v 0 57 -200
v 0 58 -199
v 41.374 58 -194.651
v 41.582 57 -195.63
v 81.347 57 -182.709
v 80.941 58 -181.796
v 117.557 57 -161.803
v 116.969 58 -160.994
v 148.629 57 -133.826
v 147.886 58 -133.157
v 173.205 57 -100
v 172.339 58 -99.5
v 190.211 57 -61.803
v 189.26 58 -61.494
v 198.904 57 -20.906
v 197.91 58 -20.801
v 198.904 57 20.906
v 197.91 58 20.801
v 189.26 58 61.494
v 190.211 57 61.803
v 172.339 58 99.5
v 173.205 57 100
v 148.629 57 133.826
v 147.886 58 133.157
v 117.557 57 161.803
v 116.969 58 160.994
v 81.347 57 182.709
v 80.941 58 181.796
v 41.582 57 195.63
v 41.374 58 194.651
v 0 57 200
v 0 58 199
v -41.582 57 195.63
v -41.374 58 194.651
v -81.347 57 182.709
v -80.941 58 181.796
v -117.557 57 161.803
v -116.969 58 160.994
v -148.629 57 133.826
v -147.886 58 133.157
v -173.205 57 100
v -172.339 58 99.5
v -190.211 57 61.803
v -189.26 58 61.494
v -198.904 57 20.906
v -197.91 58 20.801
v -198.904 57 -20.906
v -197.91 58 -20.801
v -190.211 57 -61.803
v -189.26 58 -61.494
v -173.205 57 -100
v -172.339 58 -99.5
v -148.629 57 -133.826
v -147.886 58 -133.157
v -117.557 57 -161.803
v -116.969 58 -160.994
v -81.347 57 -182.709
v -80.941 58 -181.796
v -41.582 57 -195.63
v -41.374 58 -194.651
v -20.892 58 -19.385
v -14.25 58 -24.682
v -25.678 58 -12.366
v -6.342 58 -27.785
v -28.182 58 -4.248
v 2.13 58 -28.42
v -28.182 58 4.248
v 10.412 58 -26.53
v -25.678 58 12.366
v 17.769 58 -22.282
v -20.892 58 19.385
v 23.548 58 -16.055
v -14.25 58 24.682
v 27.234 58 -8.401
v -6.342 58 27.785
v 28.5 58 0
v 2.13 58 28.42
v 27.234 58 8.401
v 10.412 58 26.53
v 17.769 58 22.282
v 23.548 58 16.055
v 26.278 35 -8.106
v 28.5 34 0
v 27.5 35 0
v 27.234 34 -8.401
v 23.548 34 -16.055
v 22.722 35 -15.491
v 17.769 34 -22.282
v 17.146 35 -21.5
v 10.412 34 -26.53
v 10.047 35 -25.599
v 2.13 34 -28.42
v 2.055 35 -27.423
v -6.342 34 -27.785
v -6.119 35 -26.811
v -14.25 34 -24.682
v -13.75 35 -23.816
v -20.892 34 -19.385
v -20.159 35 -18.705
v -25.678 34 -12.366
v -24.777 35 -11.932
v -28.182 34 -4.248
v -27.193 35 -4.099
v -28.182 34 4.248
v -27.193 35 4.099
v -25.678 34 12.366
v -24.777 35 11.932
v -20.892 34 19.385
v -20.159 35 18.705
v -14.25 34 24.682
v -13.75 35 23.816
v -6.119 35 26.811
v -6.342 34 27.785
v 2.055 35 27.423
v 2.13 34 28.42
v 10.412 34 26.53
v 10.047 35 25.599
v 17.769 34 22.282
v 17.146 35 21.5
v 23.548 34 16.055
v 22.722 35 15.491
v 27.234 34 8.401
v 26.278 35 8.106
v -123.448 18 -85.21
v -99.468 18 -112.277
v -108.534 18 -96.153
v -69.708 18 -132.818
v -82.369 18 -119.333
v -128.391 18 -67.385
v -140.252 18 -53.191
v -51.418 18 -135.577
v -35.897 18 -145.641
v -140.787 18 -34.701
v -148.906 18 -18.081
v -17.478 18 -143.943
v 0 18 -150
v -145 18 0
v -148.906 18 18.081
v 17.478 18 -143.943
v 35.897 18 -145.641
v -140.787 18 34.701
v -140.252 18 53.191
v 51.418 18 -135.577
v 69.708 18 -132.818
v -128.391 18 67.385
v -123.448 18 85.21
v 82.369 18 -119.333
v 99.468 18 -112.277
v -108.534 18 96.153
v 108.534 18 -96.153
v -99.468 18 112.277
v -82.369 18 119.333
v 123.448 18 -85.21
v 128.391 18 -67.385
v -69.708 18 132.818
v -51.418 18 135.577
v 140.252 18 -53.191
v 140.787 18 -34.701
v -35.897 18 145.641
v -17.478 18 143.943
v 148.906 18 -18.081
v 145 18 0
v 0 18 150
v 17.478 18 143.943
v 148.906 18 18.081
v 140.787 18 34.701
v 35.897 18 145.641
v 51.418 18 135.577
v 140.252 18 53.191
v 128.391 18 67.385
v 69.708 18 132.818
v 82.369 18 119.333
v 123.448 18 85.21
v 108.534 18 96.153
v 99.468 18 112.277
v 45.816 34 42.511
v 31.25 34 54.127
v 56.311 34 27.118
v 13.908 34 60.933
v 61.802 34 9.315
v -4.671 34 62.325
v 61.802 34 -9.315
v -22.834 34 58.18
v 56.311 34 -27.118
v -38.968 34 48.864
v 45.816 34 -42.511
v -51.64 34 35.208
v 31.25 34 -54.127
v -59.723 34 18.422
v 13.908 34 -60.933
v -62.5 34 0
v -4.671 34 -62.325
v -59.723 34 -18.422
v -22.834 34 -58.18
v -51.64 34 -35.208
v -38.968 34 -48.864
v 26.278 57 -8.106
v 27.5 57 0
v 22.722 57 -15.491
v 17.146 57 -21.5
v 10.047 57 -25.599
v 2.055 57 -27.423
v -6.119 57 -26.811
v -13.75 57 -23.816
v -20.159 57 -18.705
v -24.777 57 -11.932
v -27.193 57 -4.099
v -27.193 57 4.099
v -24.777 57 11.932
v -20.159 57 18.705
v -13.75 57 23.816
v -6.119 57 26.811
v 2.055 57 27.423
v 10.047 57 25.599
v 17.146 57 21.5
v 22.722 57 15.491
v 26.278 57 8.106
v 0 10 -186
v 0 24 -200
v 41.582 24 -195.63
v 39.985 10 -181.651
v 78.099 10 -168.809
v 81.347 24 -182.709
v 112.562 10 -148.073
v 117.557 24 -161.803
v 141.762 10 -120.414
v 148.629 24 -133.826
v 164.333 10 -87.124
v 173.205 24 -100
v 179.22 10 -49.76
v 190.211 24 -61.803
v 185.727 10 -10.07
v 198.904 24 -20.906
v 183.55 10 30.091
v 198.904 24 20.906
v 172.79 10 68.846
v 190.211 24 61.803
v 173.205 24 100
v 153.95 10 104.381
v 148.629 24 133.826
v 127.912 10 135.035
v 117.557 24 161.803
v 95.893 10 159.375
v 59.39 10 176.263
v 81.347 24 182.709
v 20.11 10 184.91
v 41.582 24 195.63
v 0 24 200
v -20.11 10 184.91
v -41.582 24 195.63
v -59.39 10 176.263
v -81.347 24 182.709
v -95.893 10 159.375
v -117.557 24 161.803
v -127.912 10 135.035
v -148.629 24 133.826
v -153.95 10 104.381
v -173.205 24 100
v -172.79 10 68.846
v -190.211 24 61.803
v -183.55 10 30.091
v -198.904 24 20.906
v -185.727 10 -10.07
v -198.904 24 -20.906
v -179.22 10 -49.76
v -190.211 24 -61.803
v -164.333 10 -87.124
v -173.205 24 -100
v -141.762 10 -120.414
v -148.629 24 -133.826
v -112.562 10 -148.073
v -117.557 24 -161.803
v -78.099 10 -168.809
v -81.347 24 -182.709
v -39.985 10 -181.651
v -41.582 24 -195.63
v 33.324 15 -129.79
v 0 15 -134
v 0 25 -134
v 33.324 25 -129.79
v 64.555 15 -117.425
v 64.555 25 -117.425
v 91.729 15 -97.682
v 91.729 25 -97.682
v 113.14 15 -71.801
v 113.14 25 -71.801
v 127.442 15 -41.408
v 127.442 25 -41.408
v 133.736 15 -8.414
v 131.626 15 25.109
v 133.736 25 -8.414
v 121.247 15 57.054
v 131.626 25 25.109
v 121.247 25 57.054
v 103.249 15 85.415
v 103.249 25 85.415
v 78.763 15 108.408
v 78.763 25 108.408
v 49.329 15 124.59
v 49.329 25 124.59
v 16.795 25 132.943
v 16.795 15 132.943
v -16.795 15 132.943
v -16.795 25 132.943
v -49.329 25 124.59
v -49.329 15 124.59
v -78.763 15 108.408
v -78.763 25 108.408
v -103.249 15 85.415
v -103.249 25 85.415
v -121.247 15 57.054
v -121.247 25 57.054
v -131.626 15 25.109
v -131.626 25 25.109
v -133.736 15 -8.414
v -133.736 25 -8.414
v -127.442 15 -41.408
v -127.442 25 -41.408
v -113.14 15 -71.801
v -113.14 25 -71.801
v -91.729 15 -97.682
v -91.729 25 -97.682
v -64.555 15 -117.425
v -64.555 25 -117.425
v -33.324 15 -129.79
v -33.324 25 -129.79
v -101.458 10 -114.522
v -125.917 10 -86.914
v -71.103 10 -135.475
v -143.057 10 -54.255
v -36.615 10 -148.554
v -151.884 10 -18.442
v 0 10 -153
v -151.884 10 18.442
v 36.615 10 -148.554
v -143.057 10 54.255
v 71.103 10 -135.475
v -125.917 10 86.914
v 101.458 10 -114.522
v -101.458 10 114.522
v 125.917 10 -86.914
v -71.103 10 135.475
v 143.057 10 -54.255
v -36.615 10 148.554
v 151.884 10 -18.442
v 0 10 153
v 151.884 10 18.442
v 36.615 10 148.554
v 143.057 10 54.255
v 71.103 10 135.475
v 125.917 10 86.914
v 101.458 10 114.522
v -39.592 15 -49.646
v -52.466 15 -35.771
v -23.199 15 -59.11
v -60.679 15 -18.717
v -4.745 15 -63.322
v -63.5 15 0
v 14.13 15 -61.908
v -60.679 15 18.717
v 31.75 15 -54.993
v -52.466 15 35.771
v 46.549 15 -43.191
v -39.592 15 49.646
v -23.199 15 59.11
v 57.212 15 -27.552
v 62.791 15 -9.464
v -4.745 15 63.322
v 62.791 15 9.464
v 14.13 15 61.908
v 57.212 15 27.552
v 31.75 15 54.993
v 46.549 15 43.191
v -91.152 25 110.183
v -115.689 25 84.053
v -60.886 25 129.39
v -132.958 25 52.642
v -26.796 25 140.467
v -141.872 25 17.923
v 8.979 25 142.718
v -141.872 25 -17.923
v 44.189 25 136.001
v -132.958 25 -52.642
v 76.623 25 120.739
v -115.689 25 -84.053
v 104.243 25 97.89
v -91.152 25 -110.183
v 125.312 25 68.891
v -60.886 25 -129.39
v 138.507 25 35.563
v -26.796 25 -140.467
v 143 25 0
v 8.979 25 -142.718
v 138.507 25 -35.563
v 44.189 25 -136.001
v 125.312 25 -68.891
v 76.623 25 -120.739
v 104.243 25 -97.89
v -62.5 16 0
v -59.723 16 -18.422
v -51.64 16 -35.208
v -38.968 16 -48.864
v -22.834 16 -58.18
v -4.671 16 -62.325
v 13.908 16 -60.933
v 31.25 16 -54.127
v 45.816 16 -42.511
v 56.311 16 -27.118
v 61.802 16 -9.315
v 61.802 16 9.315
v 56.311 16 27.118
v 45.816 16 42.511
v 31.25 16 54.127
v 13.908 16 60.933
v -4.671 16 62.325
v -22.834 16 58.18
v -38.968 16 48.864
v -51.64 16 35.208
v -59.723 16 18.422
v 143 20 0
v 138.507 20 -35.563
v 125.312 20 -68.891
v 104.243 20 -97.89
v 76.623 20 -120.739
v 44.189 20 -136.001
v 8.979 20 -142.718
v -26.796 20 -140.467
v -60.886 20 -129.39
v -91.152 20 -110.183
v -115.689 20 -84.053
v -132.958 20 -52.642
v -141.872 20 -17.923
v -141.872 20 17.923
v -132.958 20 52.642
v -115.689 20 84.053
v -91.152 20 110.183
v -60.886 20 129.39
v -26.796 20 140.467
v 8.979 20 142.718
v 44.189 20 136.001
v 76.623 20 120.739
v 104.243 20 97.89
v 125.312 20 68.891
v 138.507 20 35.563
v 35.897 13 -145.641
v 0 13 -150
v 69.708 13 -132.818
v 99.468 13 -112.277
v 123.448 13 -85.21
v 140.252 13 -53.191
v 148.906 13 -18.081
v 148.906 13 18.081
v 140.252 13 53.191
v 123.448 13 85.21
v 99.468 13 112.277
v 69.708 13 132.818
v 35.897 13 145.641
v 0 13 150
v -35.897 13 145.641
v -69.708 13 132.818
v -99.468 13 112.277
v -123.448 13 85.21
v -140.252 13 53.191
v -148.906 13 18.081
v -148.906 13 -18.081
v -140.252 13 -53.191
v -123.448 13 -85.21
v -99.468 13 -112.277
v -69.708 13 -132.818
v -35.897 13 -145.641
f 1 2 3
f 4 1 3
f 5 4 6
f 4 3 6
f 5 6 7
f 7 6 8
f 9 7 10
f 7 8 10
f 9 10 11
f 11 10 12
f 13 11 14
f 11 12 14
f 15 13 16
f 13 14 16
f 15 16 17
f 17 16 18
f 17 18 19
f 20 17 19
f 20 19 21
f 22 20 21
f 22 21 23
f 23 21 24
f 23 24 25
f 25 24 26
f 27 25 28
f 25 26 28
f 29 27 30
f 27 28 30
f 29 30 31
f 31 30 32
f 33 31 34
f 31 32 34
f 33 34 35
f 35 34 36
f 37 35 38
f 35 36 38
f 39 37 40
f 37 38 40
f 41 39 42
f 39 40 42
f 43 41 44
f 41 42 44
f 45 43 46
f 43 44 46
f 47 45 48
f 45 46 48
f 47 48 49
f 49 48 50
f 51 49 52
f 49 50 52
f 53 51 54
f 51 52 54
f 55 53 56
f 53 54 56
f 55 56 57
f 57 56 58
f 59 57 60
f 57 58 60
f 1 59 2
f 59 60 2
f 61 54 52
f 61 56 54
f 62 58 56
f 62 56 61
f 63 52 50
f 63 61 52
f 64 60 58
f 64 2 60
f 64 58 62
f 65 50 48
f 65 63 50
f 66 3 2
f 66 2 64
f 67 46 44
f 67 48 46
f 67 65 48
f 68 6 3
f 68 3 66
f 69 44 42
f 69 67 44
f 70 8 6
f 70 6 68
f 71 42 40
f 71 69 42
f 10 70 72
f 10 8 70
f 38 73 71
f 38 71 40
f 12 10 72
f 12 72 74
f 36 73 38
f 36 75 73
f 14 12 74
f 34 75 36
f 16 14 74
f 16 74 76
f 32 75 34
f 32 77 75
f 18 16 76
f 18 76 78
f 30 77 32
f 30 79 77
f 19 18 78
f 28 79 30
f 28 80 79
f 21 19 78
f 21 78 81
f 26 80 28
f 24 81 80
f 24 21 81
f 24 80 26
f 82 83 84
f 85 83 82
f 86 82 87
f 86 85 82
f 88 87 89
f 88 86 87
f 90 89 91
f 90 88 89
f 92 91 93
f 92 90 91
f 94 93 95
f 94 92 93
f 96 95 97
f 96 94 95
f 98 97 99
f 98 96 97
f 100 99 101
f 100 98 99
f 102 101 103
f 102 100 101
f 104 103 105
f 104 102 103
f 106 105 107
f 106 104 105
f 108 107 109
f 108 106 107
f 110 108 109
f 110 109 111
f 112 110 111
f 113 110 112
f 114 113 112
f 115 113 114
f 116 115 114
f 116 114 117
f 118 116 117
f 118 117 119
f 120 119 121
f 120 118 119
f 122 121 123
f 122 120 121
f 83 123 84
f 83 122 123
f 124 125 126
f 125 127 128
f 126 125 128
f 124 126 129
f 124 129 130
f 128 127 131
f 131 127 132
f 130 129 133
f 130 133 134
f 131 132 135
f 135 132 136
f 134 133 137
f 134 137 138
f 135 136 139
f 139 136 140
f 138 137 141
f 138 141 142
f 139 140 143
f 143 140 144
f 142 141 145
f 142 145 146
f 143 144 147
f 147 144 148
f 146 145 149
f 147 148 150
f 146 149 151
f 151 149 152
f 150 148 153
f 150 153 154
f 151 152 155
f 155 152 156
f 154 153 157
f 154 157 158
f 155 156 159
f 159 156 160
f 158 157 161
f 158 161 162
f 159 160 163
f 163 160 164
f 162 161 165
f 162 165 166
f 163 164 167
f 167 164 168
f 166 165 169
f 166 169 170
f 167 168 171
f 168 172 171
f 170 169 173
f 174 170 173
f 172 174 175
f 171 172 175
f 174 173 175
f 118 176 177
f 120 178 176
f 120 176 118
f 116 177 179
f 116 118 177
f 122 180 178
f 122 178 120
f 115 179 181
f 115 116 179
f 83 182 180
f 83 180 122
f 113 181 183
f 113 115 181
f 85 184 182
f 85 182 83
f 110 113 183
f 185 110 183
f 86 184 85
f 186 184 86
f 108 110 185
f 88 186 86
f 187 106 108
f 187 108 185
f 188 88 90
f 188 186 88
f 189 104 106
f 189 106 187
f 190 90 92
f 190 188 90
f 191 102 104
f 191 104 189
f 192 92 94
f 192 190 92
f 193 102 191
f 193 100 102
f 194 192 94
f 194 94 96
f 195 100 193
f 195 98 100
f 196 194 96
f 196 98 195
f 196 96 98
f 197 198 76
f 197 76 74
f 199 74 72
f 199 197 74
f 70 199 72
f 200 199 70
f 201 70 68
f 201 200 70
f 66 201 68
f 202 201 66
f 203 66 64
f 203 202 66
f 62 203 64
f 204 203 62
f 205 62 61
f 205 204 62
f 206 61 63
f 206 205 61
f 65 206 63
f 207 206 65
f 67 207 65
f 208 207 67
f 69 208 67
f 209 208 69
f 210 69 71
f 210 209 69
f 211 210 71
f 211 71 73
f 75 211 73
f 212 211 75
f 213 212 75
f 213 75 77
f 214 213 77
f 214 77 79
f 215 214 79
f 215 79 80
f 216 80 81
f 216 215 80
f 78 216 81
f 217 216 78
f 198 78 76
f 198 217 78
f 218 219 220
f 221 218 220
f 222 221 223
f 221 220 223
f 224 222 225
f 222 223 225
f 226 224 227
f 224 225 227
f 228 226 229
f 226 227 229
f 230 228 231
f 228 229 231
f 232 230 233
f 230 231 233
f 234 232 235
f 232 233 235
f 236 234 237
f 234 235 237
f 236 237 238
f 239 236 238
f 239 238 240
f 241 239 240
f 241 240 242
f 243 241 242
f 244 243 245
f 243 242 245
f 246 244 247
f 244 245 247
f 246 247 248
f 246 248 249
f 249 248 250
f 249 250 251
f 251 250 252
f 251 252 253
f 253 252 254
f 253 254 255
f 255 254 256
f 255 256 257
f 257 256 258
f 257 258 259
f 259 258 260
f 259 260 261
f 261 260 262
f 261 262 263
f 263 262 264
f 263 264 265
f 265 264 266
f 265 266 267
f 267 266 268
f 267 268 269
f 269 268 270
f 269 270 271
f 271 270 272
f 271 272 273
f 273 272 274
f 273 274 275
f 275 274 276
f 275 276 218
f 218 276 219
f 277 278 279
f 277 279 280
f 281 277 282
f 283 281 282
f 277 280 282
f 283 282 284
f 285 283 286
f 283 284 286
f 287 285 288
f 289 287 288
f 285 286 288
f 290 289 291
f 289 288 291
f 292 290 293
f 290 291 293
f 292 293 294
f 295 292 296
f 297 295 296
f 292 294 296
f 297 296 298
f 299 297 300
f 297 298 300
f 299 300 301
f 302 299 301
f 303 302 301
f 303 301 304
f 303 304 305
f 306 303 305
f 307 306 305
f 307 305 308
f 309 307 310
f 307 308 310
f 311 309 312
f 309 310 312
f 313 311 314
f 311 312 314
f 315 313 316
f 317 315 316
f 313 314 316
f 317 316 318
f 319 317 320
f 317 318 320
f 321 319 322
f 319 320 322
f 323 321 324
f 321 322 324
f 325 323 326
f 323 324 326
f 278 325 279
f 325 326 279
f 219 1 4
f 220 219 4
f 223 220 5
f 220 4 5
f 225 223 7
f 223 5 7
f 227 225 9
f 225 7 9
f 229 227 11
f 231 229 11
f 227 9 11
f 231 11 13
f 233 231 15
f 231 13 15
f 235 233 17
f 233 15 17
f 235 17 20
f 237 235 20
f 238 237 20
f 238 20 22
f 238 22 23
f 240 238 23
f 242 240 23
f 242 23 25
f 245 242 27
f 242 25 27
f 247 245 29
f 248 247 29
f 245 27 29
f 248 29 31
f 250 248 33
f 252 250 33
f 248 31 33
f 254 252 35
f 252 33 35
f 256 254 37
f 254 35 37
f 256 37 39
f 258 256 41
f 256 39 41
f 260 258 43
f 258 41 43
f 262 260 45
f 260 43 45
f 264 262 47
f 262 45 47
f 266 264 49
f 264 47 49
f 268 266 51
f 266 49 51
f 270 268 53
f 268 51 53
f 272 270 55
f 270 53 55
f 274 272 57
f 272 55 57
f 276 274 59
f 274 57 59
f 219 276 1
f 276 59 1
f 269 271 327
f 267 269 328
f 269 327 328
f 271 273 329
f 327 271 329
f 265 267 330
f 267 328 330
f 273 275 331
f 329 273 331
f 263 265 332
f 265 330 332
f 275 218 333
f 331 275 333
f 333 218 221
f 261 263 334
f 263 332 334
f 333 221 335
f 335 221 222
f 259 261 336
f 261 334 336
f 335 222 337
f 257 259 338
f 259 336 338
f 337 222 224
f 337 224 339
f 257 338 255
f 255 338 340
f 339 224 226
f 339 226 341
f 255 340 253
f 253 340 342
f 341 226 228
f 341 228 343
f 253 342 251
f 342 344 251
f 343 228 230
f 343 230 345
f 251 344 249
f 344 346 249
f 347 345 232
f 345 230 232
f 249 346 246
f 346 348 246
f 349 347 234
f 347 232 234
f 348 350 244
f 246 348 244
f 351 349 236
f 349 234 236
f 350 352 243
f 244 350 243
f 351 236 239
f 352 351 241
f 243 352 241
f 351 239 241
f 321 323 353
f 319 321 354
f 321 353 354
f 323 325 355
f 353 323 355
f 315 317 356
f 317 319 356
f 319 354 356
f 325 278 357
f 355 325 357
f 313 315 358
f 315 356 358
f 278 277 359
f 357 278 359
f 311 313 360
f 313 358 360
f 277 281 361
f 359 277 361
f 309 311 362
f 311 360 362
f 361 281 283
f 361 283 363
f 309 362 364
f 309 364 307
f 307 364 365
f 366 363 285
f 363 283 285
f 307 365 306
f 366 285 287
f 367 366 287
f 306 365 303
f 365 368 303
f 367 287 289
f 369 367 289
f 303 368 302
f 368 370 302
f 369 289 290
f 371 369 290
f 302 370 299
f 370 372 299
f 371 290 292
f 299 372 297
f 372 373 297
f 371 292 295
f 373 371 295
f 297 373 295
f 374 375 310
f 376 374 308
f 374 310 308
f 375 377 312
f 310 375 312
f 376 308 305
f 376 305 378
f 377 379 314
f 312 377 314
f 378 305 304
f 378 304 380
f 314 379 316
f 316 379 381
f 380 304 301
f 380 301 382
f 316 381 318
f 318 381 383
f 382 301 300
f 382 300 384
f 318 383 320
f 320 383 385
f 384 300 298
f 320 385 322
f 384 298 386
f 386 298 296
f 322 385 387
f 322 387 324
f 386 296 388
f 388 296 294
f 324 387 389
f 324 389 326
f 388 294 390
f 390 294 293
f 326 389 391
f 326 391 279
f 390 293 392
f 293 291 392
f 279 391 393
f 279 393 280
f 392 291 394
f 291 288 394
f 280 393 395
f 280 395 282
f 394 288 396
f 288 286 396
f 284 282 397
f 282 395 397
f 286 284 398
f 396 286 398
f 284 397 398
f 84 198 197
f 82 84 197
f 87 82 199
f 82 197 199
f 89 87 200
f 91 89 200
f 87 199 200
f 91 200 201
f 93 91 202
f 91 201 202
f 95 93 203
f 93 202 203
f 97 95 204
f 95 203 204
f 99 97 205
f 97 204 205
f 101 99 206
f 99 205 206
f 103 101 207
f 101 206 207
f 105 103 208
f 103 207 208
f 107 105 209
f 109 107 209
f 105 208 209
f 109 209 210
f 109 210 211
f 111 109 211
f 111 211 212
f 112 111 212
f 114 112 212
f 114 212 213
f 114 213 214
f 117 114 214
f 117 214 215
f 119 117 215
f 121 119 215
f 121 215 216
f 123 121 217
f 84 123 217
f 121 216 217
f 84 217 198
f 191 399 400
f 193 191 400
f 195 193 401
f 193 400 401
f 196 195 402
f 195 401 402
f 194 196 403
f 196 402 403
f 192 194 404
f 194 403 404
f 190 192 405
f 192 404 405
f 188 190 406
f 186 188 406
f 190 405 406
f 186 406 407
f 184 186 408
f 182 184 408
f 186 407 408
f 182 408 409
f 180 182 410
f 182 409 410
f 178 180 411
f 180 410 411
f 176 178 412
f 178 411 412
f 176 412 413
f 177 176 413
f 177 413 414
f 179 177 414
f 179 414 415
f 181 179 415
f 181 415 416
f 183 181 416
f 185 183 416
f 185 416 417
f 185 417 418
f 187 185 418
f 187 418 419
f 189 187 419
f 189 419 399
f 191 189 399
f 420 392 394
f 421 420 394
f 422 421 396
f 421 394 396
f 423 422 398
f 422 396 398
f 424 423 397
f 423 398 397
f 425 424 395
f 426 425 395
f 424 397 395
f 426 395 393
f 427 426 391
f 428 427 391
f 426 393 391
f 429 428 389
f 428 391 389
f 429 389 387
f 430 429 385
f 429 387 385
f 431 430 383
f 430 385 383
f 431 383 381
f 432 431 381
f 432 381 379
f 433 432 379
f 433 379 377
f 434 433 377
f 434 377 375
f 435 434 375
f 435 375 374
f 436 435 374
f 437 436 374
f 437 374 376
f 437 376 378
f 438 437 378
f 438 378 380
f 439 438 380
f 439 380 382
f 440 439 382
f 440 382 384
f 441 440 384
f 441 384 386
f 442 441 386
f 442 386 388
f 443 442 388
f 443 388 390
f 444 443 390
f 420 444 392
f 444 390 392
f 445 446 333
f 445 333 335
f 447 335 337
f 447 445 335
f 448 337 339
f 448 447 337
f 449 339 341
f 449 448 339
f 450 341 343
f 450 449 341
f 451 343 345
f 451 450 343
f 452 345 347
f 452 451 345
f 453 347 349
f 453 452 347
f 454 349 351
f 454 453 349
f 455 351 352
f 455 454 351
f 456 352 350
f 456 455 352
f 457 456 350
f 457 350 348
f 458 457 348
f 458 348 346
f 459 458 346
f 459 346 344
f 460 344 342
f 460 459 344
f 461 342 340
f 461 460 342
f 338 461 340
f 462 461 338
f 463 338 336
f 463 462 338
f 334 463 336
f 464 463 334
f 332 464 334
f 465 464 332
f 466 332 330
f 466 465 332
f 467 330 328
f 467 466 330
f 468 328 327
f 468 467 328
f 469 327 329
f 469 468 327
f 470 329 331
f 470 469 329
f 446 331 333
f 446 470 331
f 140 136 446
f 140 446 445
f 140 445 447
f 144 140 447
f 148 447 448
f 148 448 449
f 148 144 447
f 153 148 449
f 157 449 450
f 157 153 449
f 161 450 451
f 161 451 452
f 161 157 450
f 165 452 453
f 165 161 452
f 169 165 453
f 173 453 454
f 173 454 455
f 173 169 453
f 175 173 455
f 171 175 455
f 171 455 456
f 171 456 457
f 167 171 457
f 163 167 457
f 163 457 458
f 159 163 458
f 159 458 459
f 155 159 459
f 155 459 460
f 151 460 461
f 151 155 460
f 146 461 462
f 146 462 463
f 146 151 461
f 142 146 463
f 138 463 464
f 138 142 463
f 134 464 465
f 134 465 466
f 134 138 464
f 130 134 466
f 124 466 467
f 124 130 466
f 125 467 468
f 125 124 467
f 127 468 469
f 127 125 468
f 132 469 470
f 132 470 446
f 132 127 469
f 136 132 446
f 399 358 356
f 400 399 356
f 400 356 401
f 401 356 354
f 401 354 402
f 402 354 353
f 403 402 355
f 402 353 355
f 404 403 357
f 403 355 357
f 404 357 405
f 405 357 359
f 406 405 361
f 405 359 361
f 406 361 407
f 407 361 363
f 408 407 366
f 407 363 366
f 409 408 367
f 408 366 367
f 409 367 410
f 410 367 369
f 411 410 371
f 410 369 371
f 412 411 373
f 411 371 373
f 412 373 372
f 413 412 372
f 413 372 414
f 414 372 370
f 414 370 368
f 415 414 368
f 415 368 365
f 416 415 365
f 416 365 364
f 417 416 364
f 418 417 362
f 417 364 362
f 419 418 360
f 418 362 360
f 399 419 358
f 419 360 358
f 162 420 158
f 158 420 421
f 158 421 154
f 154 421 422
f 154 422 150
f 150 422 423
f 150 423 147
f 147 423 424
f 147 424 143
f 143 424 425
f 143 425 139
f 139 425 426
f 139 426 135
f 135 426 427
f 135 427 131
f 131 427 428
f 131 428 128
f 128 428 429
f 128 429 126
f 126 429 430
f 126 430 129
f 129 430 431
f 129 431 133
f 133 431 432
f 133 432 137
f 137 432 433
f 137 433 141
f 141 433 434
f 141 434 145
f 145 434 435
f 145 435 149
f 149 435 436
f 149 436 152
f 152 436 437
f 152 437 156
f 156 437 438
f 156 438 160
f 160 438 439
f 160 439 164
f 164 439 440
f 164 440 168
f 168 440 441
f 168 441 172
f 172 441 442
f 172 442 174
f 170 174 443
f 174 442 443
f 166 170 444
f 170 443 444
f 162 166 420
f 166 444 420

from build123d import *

# Parameters (mm, degrees)
SKETCH_1_W                = 200
SKETCH_1_H                = 48
HOLE_WIZARD_1_D           = 286
HOLE_WIZARD_1_DEPTH       = 15
SKETCH_4_W                = 134
SKETCH_4_H                = 10
SKETCH_5_W                = 7
SKETCH_5_H                = 8
HOLE_WIZARD_3_D           = 55
HOLE_WIZARD_3_CBORE_D     = 125
HOLE_WIZARD_3_CBORE_DEPTH = 19
CHAMFER_1_SIZE2           = 1.000000001
CHAMFER_1_SIZE            = 0.999999999
CHAMFER_2_SIZE            = 2.999999997
CHAMFER_2_SIZE2           = 3.000000003
CHAMFER_3_SIZE            = 13.999999987
CHAMFER_3_SIZE2           = 14.000000013
CHAMFER_4_SIZE            = 1.999999998
CHAMFER_4_SIZE2           = 2.000000002


with BuildPart() as part:
    # 草圖1 → 旋轉1 (revolve)
    with BuildSketch(Plane.XY, mode=Mode.PRIVATE) as revolve_1_sk:
        with Locations((100, 34)):
            Rectangle(SKETCH_1_W, SKETCH_1_H)
    revolve(revolve_1_sk.sketch.rotate(Axis((0, 58, 0), (0, -1, 0)), 270), axis=Axis((0, 58, 0), (0, -1, 0)))

    # 鑽孔1
    with Locations(Plane(origin=(0, 10, 0), x_dir=(-1, 0, 0), z_dir=(0, -1, 0))):
        with Locations((0, 0)):
            Hole(HOLE_WIZARD_1_D / 2, depth=HOLE_WIZARD_1_DEPTH)

    # 草圖4 → 旋轉2 (revolve)
    with BuildSketch(Plane.XY, mode=Mode.PRIVATE) as revolve_2_sk:
        with Locations((67, 20)):
            Rectangle(SKETCH_4_W, SKETCH_4_H)
    revolve(revolve_2_sk.sketch.rotate(Axis((0, 25, 0), (0, -1, 0)), 270), axis=Axis((0, 25, 0), (0, -1, 0)))

    # 草圖5 → 除料-旋轉1 (revolve, cut)
    with BuildSketch(Plane.XY, mode=Mode.PRIVATE) as cut_revolve_1_sk:
        with Locations((146.5, 14)):
            Rectangle(SKETCH_5_W, SKETCH_5_H)
    revolve(cut_revolve_1_sk.sketch.rotate(Axis((0, 18, 0), (0, -1, 0)), 270), axis=Axis((0, 18, 0), (0, -1, 0)), mode=Mode.SUBTRACT)

    # 鑽孔3 (through all)
    with Locations(Plane(origin=(0, 15, 0), x_dir=(-1, 0, 0), z_dir=(0, -1, 0))):
        with Locations((0, 0)):
            CounterBoreHole(HOLE_WIZARD_3_D / 2, HOLE_WIZARD_3_CBORE_D / 2, HOLE_WIZARD_3_CBORE_DEPTH)

    # 導角1
    chamfer_1_edges = [part.edges().sort_by_distance(p)[0] for p in [
        (62.5, 15, 0),
        (-27.5, 58, 0),
        (-27.5, 34, 0),
        (0, 58, 200),
    ]]
    chamfer(chamfer_1_edges, length=CHAMFER_1_SIZE, length2=CHAMFER_1_SIZE2)

    # 導角2
    chamfer_2_edges = [part.edges().sort_by_distance(p)[0] for p in [
        (0, 10, 150),
    ]]
    chamfer_2_side = [part.faces().sort_by_distance(p)[0] for p in [
        (0, 10, 194.343145751),
    ]]
    chamfer(chamfer_2_edges, length=CHAMFER_2_SIZE, length2=CHAMFER_2_SIZE2, reference=chamfer_2_side[0])

    # 導角3
    chamfer_3_edges = [part.edges().sort_by_distance(p)[0] for p in [
        (0, 10, 200),
    ]]
    chamfer_3_side = [part.faces().sort_by_distance(p)[0] for p in [
        (0, 10, 158.656854247),
    ]]
    chamfer(chamfer_3_edges, length=CHAMFER_3_SIZE, length2=CHAMFER_3_SIZE2, reference=chamfer_3_side[0])

    # 導角4
    chamfer_4_edges = [part.edges().sort_by_distance(p)[0] for p in [
        (-143, 18, 0),
    ]]
    chamfer_4_side = [part.faces().sort_by_distance(p)[0] for p in [
        (0, 18, 145.757359313),
    ]]
    chamfer(chamfer_4_edges, length=CHAMFER_4_SIZE, length2=CHAMFER_4_SIZE2, reference=chamfer_4_side[0])


solid = part.part
